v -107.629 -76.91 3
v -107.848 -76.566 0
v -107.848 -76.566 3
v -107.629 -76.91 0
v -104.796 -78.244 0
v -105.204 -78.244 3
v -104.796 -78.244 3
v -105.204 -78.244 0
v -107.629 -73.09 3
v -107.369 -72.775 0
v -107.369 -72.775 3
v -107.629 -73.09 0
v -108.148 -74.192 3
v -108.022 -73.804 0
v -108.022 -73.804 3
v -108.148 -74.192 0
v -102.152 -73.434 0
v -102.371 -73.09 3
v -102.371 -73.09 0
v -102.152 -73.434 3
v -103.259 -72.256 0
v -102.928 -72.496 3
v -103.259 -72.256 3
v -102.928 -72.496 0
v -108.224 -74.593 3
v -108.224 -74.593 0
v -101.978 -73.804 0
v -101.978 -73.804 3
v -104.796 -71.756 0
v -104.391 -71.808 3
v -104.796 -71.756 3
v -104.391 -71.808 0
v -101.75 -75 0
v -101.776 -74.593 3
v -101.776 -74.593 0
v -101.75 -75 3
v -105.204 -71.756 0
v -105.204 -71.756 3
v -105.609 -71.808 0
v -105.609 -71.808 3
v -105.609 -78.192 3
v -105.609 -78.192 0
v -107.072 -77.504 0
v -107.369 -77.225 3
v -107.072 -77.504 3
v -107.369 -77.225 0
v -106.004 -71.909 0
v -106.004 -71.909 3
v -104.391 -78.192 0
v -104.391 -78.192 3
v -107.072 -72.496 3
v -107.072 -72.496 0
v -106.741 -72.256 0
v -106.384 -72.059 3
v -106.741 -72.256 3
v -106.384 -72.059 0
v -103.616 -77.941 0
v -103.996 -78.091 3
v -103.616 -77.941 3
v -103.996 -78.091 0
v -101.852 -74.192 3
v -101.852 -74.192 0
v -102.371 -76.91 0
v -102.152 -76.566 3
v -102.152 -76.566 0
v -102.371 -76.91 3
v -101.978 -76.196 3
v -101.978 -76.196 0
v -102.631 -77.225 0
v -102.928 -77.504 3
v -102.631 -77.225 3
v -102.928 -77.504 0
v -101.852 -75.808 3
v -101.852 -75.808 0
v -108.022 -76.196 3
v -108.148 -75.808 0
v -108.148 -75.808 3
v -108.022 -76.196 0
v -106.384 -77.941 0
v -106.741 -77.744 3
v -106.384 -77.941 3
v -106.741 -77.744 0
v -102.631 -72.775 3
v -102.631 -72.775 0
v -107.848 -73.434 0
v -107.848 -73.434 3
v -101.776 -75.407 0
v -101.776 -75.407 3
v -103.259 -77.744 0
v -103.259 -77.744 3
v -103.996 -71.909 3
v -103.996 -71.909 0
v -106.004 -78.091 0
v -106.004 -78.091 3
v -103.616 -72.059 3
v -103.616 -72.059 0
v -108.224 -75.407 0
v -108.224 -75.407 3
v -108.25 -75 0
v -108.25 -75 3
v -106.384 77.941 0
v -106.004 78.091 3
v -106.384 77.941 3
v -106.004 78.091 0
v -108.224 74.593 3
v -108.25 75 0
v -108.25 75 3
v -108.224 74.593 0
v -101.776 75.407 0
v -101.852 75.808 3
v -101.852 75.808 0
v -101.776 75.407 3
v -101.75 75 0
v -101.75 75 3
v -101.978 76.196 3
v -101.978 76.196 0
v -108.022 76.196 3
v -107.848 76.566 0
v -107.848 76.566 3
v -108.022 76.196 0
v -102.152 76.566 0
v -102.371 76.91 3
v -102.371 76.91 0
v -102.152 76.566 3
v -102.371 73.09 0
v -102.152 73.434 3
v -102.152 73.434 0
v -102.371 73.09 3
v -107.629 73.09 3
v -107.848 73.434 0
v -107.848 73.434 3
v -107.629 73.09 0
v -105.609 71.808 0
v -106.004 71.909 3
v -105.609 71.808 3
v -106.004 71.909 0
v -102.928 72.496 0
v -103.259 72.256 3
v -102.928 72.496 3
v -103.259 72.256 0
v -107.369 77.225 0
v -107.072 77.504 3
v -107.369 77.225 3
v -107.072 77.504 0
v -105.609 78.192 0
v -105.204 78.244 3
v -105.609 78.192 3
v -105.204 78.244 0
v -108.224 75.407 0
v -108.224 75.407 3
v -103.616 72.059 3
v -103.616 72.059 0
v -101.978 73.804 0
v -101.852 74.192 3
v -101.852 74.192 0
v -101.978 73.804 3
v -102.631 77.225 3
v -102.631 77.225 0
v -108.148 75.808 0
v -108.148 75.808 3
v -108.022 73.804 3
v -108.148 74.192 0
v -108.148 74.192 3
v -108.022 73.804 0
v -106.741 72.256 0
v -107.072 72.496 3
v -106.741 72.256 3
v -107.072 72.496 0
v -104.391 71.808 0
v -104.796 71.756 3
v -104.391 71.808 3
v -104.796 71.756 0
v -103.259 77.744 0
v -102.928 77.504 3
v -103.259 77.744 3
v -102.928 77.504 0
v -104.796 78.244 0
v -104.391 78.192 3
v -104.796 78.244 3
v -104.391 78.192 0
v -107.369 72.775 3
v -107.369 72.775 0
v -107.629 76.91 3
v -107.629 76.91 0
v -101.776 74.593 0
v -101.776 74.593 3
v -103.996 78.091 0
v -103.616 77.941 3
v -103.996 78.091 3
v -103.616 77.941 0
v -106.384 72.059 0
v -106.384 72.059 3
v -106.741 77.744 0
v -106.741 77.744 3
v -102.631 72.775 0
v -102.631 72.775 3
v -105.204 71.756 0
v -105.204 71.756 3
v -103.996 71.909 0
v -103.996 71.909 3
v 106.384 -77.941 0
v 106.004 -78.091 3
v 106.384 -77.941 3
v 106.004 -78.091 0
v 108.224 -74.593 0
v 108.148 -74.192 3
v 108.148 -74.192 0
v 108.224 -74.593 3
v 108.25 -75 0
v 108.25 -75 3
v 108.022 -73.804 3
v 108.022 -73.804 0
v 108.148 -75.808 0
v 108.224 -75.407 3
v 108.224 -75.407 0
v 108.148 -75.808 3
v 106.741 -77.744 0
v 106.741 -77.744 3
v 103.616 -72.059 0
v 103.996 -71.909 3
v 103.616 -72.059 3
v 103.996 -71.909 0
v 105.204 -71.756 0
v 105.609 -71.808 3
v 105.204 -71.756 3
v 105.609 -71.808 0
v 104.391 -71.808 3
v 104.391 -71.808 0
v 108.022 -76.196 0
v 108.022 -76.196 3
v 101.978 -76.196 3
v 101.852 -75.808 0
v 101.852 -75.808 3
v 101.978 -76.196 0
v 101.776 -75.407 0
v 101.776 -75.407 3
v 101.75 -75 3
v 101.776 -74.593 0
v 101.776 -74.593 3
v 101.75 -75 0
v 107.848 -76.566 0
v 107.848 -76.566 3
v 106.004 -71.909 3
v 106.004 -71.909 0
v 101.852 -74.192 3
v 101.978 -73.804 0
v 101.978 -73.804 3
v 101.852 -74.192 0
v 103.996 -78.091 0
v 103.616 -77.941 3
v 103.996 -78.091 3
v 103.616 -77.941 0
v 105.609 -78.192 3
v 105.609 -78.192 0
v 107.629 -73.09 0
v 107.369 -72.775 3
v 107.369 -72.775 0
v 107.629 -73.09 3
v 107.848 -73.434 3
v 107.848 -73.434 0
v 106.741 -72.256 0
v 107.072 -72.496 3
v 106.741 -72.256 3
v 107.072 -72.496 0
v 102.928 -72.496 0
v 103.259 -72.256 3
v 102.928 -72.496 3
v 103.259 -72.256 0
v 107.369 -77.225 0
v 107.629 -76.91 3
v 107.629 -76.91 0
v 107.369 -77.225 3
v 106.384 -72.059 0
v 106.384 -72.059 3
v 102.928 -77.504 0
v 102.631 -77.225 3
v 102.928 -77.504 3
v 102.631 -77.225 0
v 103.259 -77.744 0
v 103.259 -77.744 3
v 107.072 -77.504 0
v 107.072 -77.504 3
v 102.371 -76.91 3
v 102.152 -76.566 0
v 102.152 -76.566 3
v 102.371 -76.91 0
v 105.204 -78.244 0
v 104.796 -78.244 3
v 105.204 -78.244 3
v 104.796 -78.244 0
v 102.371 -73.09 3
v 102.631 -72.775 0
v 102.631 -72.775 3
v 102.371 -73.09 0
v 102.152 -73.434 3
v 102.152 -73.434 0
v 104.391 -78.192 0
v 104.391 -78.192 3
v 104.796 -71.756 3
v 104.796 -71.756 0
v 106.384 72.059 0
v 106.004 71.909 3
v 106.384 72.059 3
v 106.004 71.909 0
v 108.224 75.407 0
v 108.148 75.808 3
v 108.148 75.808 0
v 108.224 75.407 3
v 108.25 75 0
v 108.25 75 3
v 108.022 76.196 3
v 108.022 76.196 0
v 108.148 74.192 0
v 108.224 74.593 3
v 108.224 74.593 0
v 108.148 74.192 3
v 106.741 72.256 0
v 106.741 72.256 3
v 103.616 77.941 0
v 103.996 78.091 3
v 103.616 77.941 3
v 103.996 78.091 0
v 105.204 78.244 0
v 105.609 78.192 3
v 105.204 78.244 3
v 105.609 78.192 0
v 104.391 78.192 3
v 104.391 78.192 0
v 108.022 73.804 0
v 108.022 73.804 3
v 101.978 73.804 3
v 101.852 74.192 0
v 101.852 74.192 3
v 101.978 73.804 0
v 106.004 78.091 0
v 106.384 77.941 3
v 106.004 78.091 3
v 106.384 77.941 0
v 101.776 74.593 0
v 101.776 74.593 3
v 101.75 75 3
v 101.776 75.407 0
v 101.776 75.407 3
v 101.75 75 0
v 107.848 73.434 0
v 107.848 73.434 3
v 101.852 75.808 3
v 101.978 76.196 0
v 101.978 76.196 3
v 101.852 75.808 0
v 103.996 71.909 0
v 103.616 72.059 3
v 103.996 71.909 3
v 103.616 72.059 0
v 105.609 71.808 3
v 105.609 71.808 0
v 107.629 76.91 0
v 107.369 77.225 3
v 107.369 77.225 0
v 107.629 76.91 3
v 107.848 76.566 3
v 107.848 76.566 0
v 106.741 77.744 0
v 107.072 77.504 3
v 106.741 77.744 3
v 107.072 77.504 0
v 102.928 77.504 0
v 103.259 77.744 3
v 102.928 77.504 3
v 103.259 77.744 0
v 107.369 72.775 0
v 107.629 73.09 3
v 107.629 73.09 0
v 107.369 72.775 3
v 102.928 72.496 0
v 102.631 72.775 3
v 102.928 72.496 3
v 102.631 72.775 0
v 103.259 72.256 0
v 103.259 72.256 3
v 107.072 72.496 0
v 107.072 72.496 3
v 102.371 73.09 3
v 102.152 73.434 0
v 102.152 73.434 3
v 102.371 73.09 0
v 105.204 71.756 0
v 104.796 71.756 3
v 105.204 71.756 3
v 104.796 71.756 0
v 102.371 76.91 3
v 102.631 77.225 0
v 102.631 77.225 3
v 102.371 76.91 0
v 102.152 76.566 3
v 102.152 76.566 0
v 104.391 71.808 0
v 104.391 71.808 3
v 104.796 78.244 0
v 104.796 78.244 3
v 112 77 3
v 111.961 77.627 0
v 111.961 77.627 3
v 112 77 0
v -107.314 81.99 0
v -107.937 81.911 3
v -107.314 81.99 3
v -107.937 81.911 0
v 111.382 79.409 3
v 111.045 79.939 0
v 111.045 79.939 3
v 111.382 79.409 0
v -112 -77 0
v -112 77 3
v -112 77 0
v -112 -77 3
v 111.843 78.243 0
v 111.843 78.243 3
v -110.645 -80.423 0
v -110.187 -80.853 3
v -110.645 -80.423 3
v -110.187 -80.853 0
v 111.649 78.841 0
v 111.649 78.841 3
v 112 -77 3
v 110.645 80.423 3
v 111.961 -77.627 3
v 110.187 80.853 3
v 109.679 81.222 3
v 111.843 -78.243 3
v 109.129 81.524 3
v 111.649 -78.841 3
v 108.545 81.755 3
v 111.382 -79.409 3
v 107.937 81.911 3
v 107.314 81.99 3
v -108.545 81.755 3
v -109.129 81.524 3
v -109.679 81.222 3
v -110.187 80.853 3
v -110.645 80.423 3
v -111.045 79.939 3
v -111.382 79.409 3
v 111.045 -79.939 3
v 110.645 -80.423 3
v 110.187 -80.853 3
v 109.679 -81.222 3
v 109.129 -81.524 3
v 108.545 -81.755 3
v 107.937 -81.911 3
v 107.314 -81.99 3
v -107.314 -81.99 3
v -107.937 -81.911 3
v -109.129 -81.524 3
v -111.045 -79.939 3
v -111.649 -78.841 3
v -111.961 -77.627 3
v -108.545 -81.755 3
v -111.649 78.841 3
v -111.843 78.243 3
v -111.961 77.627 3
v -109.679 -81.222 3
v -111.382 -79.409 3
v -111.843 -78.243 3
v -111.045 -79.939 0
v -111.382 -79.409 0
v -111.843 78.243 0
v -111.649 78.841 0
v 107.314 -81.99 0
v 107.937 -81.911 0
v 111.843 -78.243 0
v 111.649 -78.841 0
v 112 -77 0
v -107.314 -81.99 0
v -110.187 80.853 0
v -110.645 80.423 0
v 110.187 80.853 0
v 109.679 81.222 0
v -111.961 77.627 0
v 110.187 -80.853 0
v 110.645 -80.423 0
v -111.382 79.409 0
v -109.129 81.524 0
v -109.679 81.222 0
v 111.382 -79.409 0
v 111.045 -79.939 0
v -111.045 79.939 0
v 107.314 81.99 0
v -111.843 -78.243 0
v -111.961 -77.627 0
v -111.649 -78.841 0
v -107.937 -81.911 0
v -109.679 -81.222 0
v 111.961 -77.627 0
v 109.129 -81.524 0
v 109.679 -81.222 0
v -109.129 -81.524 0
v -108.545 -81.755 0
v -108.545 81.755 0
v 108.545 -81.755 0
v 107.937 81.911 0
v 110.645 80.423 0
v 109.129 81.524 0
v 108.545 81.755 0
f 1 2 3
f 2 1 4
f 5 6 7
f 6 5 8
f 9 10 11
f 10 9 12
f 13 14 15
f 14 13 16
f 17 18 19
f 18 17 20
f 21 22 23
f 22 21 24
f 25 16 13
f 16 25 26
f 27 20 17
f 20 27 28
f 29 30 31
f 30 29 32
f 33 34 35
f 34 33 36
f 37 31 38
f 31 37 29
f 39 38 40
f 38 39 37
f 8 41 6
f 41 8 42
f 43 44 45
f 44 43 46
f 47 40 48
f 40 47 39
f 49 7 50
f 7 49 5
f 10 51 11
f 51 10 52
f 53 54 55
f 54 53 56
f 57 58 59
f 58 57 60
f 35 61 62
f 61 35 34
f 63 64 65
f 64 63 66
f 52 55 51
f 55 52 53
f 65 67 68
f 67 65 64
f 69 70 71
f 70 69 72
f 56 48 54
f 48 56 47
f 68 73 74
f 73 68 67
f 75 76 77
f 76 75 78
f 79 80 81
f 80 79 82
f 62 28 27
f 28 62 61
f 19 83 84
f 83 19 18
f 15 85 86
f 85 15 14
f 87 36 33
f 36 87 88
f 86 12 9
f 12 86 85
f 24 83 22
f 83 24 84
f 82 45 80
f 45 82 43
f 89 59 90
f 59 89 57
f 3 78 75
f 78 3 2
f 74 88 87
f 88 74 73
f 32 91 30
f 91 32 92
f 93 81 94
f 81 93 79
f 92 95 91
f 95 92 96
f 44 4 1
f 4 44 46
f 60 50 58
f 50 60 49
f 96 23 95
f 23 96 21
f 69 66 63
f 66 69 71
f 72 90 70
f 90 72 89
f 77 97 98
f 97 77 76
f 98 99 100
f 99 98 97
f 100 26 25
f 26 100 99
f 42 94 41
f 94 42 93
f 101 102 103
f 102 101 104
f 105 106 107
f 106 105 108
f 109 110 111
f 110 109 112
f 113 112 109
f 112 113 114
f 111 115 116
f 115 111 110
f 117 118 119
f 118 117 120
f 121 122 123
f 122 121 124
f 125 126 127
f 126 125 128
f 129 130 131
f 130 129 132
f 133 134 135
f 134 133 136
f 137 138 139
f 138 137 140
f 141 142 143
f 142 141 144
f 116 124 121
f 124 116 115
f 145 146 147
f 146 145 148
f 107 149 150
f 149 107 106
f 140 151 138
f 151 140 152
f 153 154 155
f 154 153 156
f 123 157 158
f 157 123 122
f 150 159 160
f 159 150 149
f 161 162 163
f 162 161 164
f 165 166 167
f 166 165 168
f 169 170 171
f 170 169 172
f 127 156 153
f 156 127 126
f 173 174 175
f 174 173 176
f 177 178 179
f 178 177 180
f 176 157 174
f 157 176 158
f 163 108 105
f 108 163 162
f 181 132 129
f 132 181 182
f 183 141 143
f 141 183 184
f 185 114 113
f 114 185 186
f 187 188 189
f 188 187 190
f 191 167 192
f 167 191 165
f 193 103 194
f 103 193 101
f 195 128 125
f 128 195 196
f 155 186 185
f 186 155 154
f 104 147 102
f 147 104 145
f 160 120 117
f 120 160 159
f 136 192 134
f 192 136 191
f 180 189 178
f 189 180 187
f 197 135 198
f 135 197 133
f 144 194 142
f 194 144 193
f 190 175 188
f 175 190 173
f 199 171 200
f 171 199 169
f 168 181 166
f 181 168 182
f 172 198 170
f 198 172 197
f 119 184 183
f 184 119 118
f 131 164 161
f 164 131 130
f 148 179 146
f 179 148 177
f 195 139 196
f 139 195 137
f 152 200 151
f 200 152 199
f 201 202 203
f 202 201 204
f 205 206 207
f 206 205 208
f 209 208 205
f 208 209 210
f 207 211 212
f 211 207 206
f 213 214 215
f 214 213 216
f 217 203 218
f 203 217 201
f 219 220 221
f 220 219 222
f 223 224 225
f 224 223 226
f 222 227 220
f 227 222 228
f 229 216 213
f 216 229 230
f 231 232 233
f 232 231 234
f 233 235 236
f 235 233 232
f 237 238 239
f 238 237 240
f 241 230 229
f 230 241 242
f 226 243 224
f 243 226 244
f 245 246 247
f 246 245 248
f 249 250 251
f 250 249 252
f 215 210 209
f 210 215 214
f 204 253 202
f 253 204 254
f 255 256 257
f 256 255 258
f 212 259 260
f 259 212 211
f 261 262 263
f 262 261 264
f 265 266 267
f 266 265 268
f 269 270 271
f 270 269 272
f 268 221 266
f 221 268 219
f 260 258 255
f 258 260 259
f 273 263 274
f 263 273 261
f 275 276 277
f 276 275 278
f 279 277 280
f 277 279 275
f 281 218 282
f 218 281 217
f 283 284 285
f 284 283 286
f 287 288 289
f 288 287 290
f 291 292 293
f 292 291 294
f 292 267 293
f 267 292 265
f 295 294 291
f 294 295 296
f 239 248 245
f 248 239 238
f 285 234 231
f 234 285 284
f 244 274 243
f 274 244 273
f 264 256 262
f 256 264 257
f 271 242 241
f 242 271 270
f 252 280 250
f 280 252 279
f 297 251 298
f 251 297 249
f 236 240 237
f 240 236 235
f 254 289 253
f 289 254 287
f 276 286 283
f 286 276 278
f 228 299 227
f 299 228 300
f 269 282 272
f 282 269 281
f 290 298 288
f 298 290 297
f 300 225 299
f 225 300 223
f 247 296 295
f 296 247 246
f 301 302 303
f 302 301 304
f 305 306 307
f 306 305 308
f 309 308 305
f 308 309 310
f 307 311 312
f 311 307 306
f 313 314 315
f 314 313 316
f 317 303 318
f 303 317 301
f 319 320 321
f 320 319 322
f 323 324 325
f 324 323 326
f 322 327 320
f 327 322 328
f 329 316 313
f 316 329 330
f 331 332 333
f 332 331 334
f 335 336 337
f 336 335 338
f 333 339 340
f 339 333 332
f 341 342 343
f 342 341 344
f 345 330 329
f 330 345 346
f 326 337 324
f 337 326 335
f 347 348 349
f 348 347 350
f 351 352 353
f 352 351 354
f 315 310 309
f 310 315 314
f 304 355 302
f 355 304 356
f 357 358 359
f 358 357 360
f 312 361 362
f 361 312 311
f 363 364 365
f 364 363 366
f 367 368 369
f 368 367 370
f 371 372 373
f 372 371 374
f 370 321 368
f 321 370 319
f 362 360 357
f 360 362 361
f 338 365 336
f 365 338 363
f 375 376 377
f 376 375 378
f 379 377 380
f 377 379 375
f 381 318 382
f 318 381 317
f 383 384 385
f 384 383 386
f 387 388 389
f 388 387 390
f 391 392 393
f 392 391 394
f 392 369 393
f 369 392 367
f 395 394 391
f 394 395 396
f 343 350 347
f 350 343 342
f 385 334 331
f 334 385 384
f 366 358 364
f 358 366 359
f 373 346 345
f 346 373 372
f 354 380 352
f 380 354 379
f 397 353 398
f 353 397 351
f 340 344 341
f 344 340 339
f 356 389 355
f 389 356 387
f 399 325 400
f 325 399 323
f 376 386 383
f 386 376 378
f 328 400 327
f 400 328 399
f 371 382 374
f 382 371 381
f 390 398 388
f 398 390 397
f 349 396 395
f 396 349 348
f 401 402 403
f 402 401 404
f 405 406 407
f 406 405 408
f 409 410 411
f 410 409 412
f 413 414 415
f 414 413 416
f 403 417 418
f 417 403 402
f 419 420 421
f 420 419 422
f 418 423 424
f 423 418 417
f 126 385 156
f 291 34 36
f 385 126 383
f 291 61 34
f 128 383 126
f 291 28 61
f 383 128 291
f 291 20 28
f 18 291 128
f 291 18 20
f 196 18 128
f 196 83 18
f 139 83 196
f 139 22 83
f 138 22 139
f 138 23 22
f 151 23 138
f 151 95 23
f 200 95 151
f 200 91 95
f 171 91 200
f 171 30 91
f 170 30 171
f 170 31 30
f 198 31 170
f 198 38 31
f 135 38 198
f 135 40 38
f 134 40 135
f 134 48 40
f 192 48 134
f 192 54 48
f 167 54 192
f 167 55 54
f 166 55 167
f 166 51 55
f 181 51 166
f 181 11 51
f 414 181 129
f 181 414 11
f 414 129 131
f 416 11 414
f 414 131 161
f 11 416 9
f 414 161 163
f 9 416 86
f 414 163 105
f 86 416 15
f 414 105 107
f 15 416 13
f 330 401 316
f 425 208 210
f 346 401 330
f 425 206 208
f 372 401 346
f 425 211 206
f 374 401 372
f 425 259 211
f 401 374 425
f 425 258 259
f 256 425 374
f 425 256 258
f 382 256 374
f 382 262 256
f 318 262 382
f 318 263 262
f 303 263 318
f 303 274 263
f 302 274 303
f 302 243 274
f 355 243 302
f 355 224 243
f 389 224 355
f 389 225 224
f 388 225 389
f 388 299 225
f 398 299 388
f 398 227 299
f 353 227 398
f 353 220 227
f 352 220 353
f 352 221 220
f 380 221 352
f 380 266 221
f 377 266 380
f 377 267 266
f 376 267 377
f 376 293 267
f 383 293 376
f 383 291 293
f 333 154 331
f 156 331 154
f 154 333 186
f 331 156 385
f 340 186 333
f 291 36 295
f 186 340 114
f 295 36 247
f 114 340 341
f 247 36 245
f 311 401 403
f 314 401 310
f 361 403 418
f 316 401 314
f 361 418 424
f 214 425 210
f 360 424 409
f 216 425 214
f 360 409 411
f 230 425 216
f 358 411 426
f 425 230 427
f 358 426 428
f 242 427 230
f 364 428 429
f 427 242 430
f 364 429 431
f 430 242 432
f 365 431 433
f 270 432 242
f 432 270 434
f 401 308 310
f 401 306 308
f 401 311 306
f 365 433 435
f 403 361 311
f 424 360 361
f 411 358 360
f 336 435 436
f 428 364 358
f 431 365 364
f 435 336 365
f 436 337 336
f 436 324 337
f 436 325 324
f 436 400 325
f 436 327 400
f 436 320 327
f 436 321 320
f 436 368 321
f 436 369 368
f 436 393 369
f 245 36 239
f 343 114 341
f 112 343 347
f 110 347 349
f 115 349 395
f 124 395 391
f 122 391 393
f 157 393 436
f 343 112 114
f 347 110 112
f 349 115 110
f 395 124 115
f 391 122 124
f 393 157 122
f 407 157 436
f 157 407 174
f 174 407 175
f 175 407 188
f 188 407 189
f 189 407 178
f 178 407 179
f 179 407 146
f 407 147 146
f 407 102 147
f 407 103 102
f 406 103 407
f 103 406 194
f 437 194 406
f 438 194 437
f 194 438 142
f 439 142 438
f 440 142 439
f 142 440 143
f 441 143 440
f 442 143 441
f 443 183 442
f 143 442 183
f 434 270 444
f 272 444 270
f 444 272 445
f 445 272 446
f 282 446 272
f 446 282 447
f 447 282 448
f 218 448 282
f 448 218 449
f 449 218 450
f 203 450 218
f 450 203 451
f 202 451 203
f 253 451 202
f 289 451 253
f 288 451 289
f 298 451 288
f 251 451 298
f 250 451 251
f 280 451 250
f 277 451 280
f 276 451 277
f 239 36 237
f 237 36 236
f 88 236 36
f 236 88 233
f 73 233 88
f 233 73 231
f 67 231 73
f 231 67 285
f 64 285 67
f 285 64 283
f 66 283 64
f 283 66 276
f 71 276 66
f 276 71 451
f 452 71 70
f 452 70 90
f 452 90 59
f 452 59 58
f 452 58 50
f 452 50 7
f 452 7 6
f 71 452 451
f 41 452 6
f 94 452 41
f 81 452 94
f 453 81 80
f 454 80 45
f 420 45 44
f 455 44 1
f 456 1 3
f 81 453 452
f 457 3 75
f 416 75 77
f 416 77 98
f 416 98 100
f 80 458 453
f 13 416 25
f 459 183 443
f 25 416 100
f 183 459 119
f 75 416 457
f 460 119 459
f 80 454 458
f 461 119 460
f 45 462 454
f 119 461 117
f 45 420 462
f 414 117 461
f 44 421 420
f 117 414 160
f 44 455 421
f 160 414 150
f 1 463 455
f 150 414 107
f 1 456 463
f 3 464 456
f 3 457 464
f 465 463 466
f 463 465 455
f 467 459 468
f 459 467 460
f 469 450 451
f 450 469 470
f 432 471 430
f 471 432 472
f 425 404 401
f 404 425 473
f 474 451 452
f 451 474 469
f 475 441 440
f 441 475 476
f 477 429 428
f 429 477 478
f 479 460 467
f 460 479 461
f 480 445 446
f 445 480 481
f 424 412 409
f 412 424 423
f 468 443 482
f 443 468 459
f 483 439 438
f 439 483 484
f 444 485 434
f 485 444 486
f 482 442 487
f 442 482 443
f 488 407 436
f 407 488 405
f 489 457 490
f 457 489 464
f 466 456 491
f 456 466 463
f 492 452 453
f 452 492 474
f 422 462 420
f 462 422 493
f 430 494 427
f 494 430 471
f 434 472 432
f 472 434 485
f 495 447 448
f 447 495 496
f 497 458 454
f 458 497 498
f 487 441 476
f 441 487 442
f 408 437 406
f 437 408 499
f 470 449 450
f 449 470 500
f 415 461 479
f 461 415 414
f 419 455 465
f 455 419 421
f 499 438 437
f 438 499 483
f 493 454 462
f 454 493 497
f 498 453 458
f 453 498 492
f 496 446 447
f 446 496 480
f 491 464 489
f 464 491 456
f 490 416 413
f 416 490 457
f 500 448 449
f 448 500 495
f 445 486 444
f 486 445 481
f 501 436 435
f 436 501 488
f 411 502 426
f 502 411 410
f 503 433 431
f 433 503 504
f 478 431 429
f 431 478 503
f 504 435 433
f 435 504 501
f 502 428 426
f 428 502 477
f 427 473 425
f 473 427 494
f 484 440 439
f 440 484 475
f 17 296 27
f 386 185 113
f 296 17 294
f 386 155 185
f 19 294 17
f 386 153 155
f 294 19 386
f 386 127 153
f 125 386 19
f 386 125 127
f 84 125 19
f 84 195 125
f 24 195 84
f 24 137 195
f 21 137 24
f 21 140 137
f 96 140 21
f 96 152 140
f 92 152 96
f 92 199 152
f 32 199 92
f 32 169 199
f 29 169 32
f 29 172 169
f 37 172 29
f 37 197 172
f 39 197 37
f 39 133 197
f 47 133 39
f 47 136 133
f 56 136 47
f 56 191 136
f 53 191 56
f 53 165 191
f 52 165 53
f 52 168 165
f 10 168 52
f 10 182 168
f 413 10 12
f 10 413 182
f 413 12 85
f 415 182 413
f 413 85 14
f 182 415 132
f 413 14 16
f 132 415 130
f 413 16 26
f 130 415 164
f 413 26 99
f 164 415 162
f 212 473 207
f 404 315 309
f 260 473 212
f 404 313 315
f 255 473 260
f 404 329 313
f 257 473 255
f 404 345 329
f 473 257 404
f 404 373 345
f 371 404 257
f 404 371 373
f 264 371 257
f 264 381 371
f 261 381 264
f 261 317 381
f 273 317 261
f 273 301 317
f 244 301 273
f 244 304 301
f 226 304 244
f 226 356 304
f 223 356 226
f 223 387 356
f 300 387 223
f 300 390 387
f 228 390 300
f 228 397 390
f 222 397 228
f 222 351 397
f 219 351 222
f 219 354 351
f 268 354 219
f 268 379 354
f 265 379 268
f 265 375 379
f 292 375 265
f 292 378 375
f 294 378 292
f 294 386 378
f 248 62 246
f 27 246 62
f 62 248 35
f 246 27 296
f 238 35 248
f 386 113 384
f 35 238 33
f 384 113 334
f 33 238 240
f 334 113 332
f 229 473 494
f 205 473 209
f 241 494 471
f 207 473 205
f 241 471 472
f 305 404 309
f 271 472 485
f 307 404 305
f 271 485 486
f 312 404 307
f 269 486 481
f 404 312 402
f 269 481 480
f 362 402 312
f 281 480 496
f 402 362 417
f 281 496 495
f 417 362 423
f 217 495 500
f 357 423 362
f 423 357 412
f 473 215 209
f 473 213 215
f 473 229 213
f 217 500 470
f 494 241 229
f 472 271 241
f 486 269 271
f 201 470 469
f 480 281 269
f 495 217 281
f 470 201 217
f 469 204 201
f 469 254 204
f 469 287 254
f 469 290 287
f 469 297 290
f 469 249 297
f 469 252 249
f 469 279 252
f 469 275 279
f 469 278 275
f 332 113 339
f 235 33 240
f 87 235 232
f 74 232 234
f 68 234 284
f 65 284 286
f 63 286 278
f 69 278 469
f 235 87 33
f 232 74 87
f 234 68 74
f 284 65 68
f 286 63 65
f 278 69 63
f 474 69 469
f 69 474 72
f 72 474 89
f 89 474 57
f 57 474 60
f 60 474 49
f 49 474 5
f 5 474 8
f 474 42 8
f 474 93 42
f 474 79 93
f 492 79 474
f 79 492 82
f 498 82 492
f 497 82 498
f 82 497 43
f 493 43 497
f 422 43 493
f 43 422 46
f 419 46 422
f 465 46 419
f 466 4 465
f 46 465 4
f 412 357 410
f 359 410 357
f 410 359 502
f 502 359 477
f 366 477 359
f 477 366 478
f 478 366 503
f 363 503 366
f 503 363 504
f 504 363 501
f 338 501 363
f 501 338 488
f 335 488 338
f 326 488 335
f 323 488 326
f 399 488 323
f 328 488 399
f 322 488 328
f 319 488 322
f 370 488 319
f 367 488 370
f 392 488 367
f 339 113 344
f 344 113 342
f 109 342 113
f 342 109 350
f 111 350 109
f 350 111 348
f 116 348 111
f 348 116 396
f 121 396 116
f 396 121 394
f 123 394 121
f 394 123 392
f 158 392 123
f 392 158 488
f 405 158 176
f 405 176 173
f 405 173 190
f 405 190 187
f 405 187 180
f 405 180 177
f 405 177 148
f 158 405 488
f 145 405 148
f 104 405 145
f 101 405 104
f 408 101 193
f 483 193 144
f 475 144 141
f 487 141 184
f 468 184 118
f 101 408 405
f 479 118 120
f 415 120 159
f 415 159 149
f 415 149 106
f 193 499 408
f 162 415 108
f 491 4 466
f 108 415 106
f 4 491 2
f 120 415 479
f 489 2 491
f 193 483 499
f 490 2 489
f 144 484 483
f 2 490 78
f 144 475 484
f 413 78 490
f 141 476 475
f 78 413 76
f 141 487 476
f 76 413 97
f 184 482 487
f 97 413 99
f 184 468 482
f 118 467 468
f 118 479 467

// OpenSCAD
$fn = 50;


difference() {
	union() {
		hull() {
			translate(v = [-107.0000000000, 77.0000000000, 0]) {
				cylinder(h = 3, r = 5);
			}
			translate(v = [107.0000000000, 77.0000000000, 0]) {
				cylinder(h = 3, r = 5);
			}
			translate(v = [-107.0000000000, -77.0000000000, 0]) {
				cylinder(h = 3, r = 5);
			}
			translate(v = [107.0000000000, -77.0000000000, 0]) {
				cylinder(h = 3, r = 5);
			}
		}
	}
	union() {
		translate(v = [-105.0000000000, -75.0000000000, -100.0000000000]) {
			cylinder(h = 200, r = 3.2500000000);
		}
		translate(v = [-105.0000000000, 75.0000000000, -100.0000000000]) {
			cylinder(h = 200, r = 3.2500000000);
		}
		translate(v = [105.0000000000, -75.0000000000, -100.0000000000]) {
			cylinder(h = 200, r = 3.2500000000);
		}
		translate(v = [105.0000000000, 75.0000000000, -100.0000000000]) {
			cylinder(h = 200, r = 3.2500000000);
		}
	}
}
